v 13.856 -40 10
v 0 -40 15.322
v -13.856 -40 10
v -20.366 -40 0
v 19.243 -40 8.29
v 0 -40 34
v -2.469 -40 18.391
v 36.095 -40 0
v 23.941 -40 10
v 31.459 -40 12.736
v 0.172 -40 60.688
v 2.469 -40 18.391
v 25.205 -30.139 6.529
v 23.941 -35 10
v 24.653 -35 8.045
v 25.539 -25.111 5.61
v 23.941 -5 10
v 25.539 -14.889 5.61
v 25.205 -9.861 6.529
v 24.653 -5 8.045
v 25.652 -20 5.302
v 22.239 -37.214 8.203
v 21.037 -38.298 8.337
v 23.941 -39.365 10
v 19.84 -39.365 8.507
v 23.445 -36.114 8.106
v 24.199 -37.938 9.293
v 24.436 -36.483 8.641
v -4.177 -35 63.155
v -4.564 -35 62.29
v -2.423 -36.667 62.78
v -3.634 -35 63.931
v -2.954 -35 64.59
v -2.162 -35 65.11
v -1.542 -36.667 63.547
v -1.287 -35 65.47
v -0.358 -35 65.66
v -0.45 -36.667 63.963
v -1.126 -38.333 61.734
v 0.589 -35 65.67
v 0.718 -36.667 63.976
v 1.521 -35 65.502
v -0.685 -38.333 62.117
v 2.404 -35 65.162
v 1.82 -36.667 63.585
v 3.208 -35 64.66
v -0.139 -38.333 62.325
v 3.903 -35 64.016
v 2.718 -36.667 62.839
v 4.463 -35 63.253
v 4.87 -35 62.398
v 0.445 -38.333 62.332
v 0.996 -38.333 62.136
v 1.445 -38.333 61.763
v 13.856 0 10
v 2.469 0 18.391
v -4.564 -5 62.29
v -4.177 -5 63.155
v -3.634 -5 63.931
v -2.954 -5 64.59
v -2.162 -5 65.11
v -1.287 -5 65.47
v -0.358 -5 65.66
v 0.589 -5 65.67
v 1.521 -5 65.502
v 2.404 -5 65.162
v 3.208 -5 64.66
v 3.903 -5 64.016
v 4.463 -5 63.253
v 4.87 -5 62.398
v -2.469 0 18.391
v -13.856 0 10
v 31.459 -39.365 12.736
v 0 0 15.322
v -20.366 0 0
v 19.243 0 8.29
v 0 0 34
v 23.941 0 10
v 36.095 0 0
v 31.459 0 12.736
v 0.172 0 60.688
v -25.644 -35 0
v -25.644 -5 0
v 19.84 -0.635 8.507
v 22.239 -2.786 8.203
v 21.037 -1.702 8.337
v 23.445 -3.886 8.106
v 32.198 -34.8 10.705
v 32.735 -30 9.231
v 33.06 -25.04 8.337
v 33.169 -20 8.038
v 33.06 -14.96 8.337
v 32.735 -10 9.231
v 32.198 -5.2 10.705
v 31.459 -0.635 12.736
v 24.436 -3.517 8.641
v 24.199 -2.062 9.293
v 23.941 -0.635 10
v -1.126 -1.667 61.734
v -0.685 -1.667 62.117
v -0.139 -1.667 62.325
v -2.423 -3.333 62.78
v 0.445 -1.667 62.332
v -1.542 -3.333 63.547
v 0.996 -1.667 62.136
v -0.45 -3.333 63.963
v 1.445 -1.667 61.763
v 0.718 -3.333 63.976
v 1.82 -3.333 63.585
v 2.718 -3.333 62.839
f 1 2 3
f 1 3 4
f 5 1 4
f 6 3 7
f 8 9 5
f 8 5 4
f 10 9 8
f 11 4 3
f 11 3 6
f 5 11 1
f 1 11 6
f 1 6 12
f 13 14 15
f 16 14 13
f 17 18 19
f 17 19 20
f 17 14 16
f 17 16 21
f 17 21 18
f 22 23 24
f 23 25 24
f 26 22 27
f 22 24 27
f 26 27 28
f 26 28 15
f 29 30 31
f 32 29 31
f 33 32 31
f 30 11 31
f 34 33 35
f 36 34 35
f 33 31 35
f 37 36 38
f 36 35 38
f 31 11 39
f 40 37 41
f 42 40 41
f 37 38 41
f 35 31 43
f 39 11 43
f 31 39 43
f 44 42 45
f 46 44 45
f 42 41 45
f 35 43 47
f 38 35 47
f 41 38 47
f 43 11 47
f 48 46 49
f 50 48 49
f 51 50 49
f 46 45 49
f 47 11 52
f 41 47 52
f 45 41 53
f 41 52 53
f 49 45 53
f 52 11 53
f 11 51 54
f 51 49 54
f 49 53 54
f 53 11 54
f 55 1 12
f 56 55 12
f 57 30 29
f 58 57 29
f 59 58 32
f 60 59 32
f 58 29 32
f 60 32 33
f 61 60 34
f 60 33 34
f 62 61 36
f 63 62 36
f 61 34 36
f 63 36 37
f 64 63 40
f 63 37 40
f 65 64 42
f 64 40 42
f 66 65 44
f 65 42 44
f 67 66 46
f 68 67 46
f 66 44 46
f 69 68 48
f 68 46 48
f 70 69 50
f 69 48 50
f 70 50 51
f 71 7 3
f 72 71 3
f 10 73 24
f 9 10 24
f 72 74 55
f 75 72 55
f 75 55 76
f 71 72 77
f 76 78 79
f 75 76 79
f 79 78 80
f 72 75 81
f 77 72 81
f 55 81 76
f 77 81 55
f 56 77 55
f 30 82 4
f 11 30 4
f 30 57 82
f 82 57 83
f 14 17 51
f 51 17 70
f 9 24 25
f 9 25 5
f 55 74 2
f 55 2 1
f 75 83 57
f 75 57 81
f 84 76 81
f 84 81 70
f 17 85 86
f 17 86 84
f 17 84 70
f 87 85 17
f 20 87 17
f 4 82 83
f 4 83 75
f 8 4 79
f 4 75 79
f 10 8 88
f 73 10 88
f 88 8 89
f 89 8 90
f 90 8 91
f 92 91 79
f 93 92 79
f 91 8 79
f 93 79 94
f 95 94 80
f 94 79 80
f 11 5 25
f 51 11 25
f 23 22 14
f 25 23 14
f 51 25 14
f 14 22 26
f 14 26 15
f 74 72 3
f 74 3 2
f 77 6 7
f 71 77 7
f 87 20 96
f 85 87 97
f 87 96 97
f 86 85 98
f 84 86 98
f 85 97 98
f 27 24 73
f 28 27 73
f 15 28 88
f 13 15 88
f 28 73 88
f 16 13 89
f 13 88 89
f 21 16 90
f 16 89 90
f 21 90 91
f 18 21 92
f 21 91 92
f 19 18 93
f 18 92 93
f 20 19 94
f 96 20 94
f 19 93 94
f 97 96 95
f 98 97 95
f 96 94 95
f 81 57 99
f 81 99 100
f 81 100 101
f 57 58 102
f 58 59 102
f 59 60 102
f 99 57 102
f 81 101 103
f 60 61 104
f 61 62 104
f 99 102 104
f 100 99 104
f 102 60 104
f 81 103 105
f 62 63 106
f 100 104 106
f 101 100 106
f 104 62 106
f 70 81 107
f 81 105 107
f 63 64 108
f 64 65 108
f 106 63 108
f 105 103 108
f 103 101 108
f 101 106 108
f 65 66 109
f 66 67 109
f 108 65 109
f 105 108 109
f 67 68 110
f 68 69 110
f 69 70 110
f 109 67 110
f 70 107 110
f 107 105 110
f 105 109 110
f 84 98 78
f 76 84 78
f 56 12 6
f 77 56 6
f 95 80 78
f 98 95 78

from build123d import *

# Parameters (mm, degrees)
F1_DEPTH     = 40
F4_DEPTH     = 8
F5_R         = 5
F6_T1_DEPTH  = 78.6190243925
F6_T4_ANGLE  = 141.3037112845
F6_T8_DEPTH  = 68.6190243925
F6_S9_R      = 40
F6_T10_DEPTH = 38
F6_T15_DEPTH = 55.7606094527
F6_S16_R     = 40
F6_T17_DEPTH = 31
F6_T21_DEPTH = 55.7606094527
F6_S22_R     = 40
F6_T23_DEPTH = 31
F6_T25_ANGLE = 141.3037112845
F6_T29_DEPTH = 68.6190243925
F6_S31_R     = 40
F6_T32_DEPTH = 38
F6_T36_DEPTH = 55.7606094527
F6_S37_R     = 40
F6_T38_DEPTH = 31
F6_T42_DEPTH = 55.7606094527
F6_S43_R     = 40
F6_T44_DEPTH = 31
F8_DEPTH     = 40


# Not quite as in the source:
# - a fillet or chamfer that OpenCascade refuses, or shapes differently, is made with other operations: its cross-section is extruded or revolved along the edge and cut away or added


with BuildPart() as f1:
    # F0 (on Front) → F1 (new body)
    with BuildSketch(Plane.XZ):
        Polygon((-25.644130815, 0), (0, 0), (36.0945345553, 0), (31.4589509991, 12.7361611466), (23.9414100328, 10), (0, 75.778483455), align=None)
    extrude(amount=F1_DEPTH)

    # F3 (on face) → F4 (cut, through all)
    with BuildSketch(Plane(origin=(31.8722760891, 0, 11.6005597948), x_dir=(0, 1, 0), z_dir=(0.9396926208, 0, 0.3420201433))):
        with BuildLine():
            Line((-0.635083269, 1.208481717), (-39.364916731, 1.208481717))
            ThreePointArc((-39.364916731, 1.208481717), (-20, -3.791518283), (-0.635083269, 1.208481717))
        make_face()
    extrude(amount=-F4_DEPTH, mode=Mode.SUBTRACT)

    # F5
    f5_edges = [f1.edges().sort_by_distance(p)[0] for p in [
        (0, -20, 75.778483),
    ]]
    fillet(f5_edges, radius=F5_R)

    # F6: chamfer of 5 on 2 edges, made by hand

    # F6_s2 → F6_t1 (cut)
    with BuildSketch(Plane(origin=(18.4446505209, 0, 54.5039975974), x_dir=(0, 1, 0), z_dir=(-0.3205516352, 0, -0.9472310432))):
        Polygon((-35, -24.2909167836), (-40, -19.2909167836), (-40, -24.2909167836), align=None)
        Polygon((-5, -24.2909167836), (0, -19.2909167836), (0, -24.2909167836), align=None)
    extrude(amount=F6_T1_DEPTH, mode=Mode.SUBTRACT)

    # F6_s3 → F6_t4 (revolve, cut)
    with BuildSketch(Plane(origin=(18.4446505209, 0, 54.5039975974), x_dir=(0, 1, 0), z_dir=(-0.3205516352, 0, -0.9472310432))):
        Polygon((0, -19.2909167836), (-5, -24.2909167836), (0, -24.2909167836), align=None)
    revolve(axis=Axis((0.1716952919, 0, 60.6877325166), (0, 1, 0)), revolution_arc=F6_T4_ANGLE, mode=Mode.SUBTRACT)


with BuildPart() as f6_tool6:
    # F6_s7 → F6_t8 (new body)
    with BuildSketch(Plane(origin=(3.9845118306, 0, -10.9473562821), x_dir=(0, 1, 0), z_dir=(-0.3420201433, 0, 0.9396926208))):
        Polygon((0, -20.9177677723), (-5, -25.9177677723), (0, -25.9177677723), align=None)
    extrude(amount=F6_T8_DEPTH)

    # F6_s9 → F6_t10 (intersect, symmetric)
    with BuildSketch(Plane(origin=(21.9888073264, 0, 8.0032713538), x_dir=(0, 1, 0), z_dir=(0.9396926208, 0, 0.3420201433))):
        with Locations((-20, 36.208481717)):
            Circle(F6_S9_R)
    extrude(amount=F6_T10_DEPTH, both=True, mode=Mode.INTERSECT)

    split(bisect_by=Plane(origin=(-0.4133250901, 0, 1.1356013518), x_dir=(0, 1, 0), z_dir=(0.3420201433, 0, -0.9396926208)), keep=Keep.TOP)


with BuildPart() as f1_1:
    add(f1.part)

    # F6_t5: cut F6_tool6
    add(f6_tool6.part, mode=Mode.SUBTRACT)


with BuildPart() as f6_tool13:
    # F6_s14 → F6_t15 (new body)
    with BuildSketch(Plane(origin=(-0.4133250901, 0, 1.1356013518), x_dir=(0, 1, 0), z_dir=(-0.3420201433, 0, 0.9396926208))):
        Polygon((0, -20.9177677723), (-5, -25.9177677723), (0, -25.9177677723), align=None)
    extrude(amount=F6_T15_DEPTH)

    # F6_s16 → F6_t17 (cut, symmetric)
    with BuildSketch(Plane(origin=(21.9888073264, 0, 8.0032713538), x_dir=(0, 1, 0), z_dir=(0.9396926208, 0, 0.3420201433))):
        with Locations((-20, 36.208481717)):
            Circle(F6_S16_R)
    extrude(amount=F6_T17_DEPTH, both=True, mode=Mode.SUBTRACT)


with BuildPart() as f1_2:
    add(f1_1.part)

    # F6_t12: cut F6_tool13
    add(f6_tool13.part, mode=Mode.SUBTRACT)


with BuildPart() as f6_tool19:
    # F6_s20 → F6_t21 (new body)
    with BuildSketch(Plane(origin=(-0.4133250901, 0, 1.1356013518), x_dir=(0, 1, 0), z_dir=(-0.3420201433, 0, 0.9396926208))):
        Polygon((0, -20.9177677723), (-5, -25.9177677723), (0, -25.9177677723), align=None)
    extrude(amount=F6_T21_DEPTH)

    # F6_s22 → F6_t23 (intersect, symmetric)
    with BuildSketch(Plane(origin=(21.9888073264, 0, 8.0032713538), x_dir=(0, 1, 0), z_dir=(0.9396926208, 0, 0.3420201433))):
        with Locations((-20, 36.208481717)):
            Circle(F6_S22_R)
    extrude(amount=F6_T23_DEPTH, both=True, mode=Mode.INTERSECT)


with BuildPart() as f1_3:
    add(f1_2.part)

    # F6_t18: cut F6_tool19
    add(f6_tool19.part, mode=Mode.SUBTRACT)

    # F6_s24 → F6_t25 (revolve, cut)
    with BuildSketch(Plane(origin=(18.4446505209, 0, 54.5039975974), x_dir=(0, 1, 0), z_dir=(-0.3205516352, 0, -0.9472310432))):
        Polygon((-35, -24.2909167836), (-40, -19.2909167836), (-40, -24.2909167836), align=None)
    revolve(axis=Axis((0.1716952919, -40, 60.6877325166), (0, 1, 0)), revolution_arc=F6_T25_ANGLE, mode=Mode.SUBTRACT)


with BuildPart() as f6_tool27:
    # F6_s28 → F6_t29 (new body)
    with BuildSketch(Plane(origin=(3.9845118306, 0, -10.9473562821), x_dir=(0, 1, 0), z_dir=(-0.3420201433, 0, 0.9396926208))):
        Polygon((-40, -20.9177677723), (-35, -25.9177677723), (-40, -25.9177677723), align=None)
    extrude(amount=F6_T29_DEPTH)

    split(bisect_by=Plane(origin=(-0.4133250901, 0, 1.1356013518), x_dir=(0, 1, 0), z_dir=(0.3420201433, 0, -0.9396926208)), keep=Keep.TOP)

    # F6_s31 → F6_t32 (intersect, symmetric)
    with BuildSketch(Plane(origin=(21.9888073264, 0, 8.0032713538), x_dir=(0, 1, 0), z_dir=(0.9396926208, 0, 0.3420201433))):
        with Locations((-20, 36.208481717)):
            Circle(F6_S31_R)
    extrude(amount=F6_T32_DEPTH, both=True, mode=Mode.INTERSECT)


with BuildPart() as f1_4:
    add(f1_3.part)

    # F6_t26: cut F6_tool27
    add(f6_tool27.part, mode=Mode.SUBTRACT)


with BuildPart() as f6_tool34:
    # F6_s35 → F6_t36 (new body)
    with BuildSketch(Plane(origin=(-0.4133250901, 0, 1.1356013518), x_dir=(0, 1, 0), z_dir=(-0.3420201433, 0, 0.9396926208))):
        Polygon((-40, -20.9177677723), (-35, -25.9177677723), (-40, -25.9177677723), align=None)
    extrude(amount=F6_T36_DEPTH)

    # F6_s37 → F6_t38 (cut, symmetric)
    with BuildSketch(Plane(origin=(21.9888073264, 0, 8.0032713538), x_dir=(0, 1, 0), z_dir=(0.9396926208, 0, 0.3420201433))):
        with Locations((-20, 36.208481717)):
            Circle(F6_S37_R)
    extrude(amount=F6_T38_DEPTH, both=True, mode=Mode.SUBTRACT)


with BuildPart() as f1_5:
    add(f1_4.part)

    # F6_t33: cut F6_tool34
    add(f6_tool34.part, mode=Mode.SUBTRACT)


with BuildPart() as f6_tool40:
    # F6_s41 → F6_t42 (new body)
    with BuildSketch(Plane(origin=(-0.4133250901, 0, 1.1356013518), x_dir=(0, 1, 0), z_dir=(-0.3420201433, 0, 0.9396926208))):
        Polygon((-40, -20.9177677723), (-35, -25.9177677723), (-40, -25.9177677723), align=None)
    extrude(amount=F6_T42_DEPTH)

    # F6_s43 → F6_t44 (intersect, symmetric)
    with BuildSketch(Plane(origin=(21.9888073264, 0, 8.0032713538), x_dir=(0, 1, 0), z_dir=(0.9396926208, 0, 0.3420201433))):
        with Locations((-20, 36.208481717)):
            Circle(F6_S43_R)
    extrude(amount=F6_T44_DEPTH, both=True, mode=Mode.INTERSECT)


with BuildPart() as f1_6:
    add(f1_5.part)

    # F6_t39: cut F6_tool40
    add(f6_tool40.part, mode=Mode.SUBTRACT)

    # F7 (on face) → F8 (cut, through all)
    with BuildSketch(Plane.XZ.offset(40)):
        Polygon((2.4692938483, 18.390625), (0, 34), (-2.4692938483, 18.390625), (-13.8564064606, 10), (0, 15.3219454766), (13.8564064606, 10), align=None)
    extrude(amount=-F8_DEPTH, mode=Mode.SUBTRACT)


solid = f1_6.part
